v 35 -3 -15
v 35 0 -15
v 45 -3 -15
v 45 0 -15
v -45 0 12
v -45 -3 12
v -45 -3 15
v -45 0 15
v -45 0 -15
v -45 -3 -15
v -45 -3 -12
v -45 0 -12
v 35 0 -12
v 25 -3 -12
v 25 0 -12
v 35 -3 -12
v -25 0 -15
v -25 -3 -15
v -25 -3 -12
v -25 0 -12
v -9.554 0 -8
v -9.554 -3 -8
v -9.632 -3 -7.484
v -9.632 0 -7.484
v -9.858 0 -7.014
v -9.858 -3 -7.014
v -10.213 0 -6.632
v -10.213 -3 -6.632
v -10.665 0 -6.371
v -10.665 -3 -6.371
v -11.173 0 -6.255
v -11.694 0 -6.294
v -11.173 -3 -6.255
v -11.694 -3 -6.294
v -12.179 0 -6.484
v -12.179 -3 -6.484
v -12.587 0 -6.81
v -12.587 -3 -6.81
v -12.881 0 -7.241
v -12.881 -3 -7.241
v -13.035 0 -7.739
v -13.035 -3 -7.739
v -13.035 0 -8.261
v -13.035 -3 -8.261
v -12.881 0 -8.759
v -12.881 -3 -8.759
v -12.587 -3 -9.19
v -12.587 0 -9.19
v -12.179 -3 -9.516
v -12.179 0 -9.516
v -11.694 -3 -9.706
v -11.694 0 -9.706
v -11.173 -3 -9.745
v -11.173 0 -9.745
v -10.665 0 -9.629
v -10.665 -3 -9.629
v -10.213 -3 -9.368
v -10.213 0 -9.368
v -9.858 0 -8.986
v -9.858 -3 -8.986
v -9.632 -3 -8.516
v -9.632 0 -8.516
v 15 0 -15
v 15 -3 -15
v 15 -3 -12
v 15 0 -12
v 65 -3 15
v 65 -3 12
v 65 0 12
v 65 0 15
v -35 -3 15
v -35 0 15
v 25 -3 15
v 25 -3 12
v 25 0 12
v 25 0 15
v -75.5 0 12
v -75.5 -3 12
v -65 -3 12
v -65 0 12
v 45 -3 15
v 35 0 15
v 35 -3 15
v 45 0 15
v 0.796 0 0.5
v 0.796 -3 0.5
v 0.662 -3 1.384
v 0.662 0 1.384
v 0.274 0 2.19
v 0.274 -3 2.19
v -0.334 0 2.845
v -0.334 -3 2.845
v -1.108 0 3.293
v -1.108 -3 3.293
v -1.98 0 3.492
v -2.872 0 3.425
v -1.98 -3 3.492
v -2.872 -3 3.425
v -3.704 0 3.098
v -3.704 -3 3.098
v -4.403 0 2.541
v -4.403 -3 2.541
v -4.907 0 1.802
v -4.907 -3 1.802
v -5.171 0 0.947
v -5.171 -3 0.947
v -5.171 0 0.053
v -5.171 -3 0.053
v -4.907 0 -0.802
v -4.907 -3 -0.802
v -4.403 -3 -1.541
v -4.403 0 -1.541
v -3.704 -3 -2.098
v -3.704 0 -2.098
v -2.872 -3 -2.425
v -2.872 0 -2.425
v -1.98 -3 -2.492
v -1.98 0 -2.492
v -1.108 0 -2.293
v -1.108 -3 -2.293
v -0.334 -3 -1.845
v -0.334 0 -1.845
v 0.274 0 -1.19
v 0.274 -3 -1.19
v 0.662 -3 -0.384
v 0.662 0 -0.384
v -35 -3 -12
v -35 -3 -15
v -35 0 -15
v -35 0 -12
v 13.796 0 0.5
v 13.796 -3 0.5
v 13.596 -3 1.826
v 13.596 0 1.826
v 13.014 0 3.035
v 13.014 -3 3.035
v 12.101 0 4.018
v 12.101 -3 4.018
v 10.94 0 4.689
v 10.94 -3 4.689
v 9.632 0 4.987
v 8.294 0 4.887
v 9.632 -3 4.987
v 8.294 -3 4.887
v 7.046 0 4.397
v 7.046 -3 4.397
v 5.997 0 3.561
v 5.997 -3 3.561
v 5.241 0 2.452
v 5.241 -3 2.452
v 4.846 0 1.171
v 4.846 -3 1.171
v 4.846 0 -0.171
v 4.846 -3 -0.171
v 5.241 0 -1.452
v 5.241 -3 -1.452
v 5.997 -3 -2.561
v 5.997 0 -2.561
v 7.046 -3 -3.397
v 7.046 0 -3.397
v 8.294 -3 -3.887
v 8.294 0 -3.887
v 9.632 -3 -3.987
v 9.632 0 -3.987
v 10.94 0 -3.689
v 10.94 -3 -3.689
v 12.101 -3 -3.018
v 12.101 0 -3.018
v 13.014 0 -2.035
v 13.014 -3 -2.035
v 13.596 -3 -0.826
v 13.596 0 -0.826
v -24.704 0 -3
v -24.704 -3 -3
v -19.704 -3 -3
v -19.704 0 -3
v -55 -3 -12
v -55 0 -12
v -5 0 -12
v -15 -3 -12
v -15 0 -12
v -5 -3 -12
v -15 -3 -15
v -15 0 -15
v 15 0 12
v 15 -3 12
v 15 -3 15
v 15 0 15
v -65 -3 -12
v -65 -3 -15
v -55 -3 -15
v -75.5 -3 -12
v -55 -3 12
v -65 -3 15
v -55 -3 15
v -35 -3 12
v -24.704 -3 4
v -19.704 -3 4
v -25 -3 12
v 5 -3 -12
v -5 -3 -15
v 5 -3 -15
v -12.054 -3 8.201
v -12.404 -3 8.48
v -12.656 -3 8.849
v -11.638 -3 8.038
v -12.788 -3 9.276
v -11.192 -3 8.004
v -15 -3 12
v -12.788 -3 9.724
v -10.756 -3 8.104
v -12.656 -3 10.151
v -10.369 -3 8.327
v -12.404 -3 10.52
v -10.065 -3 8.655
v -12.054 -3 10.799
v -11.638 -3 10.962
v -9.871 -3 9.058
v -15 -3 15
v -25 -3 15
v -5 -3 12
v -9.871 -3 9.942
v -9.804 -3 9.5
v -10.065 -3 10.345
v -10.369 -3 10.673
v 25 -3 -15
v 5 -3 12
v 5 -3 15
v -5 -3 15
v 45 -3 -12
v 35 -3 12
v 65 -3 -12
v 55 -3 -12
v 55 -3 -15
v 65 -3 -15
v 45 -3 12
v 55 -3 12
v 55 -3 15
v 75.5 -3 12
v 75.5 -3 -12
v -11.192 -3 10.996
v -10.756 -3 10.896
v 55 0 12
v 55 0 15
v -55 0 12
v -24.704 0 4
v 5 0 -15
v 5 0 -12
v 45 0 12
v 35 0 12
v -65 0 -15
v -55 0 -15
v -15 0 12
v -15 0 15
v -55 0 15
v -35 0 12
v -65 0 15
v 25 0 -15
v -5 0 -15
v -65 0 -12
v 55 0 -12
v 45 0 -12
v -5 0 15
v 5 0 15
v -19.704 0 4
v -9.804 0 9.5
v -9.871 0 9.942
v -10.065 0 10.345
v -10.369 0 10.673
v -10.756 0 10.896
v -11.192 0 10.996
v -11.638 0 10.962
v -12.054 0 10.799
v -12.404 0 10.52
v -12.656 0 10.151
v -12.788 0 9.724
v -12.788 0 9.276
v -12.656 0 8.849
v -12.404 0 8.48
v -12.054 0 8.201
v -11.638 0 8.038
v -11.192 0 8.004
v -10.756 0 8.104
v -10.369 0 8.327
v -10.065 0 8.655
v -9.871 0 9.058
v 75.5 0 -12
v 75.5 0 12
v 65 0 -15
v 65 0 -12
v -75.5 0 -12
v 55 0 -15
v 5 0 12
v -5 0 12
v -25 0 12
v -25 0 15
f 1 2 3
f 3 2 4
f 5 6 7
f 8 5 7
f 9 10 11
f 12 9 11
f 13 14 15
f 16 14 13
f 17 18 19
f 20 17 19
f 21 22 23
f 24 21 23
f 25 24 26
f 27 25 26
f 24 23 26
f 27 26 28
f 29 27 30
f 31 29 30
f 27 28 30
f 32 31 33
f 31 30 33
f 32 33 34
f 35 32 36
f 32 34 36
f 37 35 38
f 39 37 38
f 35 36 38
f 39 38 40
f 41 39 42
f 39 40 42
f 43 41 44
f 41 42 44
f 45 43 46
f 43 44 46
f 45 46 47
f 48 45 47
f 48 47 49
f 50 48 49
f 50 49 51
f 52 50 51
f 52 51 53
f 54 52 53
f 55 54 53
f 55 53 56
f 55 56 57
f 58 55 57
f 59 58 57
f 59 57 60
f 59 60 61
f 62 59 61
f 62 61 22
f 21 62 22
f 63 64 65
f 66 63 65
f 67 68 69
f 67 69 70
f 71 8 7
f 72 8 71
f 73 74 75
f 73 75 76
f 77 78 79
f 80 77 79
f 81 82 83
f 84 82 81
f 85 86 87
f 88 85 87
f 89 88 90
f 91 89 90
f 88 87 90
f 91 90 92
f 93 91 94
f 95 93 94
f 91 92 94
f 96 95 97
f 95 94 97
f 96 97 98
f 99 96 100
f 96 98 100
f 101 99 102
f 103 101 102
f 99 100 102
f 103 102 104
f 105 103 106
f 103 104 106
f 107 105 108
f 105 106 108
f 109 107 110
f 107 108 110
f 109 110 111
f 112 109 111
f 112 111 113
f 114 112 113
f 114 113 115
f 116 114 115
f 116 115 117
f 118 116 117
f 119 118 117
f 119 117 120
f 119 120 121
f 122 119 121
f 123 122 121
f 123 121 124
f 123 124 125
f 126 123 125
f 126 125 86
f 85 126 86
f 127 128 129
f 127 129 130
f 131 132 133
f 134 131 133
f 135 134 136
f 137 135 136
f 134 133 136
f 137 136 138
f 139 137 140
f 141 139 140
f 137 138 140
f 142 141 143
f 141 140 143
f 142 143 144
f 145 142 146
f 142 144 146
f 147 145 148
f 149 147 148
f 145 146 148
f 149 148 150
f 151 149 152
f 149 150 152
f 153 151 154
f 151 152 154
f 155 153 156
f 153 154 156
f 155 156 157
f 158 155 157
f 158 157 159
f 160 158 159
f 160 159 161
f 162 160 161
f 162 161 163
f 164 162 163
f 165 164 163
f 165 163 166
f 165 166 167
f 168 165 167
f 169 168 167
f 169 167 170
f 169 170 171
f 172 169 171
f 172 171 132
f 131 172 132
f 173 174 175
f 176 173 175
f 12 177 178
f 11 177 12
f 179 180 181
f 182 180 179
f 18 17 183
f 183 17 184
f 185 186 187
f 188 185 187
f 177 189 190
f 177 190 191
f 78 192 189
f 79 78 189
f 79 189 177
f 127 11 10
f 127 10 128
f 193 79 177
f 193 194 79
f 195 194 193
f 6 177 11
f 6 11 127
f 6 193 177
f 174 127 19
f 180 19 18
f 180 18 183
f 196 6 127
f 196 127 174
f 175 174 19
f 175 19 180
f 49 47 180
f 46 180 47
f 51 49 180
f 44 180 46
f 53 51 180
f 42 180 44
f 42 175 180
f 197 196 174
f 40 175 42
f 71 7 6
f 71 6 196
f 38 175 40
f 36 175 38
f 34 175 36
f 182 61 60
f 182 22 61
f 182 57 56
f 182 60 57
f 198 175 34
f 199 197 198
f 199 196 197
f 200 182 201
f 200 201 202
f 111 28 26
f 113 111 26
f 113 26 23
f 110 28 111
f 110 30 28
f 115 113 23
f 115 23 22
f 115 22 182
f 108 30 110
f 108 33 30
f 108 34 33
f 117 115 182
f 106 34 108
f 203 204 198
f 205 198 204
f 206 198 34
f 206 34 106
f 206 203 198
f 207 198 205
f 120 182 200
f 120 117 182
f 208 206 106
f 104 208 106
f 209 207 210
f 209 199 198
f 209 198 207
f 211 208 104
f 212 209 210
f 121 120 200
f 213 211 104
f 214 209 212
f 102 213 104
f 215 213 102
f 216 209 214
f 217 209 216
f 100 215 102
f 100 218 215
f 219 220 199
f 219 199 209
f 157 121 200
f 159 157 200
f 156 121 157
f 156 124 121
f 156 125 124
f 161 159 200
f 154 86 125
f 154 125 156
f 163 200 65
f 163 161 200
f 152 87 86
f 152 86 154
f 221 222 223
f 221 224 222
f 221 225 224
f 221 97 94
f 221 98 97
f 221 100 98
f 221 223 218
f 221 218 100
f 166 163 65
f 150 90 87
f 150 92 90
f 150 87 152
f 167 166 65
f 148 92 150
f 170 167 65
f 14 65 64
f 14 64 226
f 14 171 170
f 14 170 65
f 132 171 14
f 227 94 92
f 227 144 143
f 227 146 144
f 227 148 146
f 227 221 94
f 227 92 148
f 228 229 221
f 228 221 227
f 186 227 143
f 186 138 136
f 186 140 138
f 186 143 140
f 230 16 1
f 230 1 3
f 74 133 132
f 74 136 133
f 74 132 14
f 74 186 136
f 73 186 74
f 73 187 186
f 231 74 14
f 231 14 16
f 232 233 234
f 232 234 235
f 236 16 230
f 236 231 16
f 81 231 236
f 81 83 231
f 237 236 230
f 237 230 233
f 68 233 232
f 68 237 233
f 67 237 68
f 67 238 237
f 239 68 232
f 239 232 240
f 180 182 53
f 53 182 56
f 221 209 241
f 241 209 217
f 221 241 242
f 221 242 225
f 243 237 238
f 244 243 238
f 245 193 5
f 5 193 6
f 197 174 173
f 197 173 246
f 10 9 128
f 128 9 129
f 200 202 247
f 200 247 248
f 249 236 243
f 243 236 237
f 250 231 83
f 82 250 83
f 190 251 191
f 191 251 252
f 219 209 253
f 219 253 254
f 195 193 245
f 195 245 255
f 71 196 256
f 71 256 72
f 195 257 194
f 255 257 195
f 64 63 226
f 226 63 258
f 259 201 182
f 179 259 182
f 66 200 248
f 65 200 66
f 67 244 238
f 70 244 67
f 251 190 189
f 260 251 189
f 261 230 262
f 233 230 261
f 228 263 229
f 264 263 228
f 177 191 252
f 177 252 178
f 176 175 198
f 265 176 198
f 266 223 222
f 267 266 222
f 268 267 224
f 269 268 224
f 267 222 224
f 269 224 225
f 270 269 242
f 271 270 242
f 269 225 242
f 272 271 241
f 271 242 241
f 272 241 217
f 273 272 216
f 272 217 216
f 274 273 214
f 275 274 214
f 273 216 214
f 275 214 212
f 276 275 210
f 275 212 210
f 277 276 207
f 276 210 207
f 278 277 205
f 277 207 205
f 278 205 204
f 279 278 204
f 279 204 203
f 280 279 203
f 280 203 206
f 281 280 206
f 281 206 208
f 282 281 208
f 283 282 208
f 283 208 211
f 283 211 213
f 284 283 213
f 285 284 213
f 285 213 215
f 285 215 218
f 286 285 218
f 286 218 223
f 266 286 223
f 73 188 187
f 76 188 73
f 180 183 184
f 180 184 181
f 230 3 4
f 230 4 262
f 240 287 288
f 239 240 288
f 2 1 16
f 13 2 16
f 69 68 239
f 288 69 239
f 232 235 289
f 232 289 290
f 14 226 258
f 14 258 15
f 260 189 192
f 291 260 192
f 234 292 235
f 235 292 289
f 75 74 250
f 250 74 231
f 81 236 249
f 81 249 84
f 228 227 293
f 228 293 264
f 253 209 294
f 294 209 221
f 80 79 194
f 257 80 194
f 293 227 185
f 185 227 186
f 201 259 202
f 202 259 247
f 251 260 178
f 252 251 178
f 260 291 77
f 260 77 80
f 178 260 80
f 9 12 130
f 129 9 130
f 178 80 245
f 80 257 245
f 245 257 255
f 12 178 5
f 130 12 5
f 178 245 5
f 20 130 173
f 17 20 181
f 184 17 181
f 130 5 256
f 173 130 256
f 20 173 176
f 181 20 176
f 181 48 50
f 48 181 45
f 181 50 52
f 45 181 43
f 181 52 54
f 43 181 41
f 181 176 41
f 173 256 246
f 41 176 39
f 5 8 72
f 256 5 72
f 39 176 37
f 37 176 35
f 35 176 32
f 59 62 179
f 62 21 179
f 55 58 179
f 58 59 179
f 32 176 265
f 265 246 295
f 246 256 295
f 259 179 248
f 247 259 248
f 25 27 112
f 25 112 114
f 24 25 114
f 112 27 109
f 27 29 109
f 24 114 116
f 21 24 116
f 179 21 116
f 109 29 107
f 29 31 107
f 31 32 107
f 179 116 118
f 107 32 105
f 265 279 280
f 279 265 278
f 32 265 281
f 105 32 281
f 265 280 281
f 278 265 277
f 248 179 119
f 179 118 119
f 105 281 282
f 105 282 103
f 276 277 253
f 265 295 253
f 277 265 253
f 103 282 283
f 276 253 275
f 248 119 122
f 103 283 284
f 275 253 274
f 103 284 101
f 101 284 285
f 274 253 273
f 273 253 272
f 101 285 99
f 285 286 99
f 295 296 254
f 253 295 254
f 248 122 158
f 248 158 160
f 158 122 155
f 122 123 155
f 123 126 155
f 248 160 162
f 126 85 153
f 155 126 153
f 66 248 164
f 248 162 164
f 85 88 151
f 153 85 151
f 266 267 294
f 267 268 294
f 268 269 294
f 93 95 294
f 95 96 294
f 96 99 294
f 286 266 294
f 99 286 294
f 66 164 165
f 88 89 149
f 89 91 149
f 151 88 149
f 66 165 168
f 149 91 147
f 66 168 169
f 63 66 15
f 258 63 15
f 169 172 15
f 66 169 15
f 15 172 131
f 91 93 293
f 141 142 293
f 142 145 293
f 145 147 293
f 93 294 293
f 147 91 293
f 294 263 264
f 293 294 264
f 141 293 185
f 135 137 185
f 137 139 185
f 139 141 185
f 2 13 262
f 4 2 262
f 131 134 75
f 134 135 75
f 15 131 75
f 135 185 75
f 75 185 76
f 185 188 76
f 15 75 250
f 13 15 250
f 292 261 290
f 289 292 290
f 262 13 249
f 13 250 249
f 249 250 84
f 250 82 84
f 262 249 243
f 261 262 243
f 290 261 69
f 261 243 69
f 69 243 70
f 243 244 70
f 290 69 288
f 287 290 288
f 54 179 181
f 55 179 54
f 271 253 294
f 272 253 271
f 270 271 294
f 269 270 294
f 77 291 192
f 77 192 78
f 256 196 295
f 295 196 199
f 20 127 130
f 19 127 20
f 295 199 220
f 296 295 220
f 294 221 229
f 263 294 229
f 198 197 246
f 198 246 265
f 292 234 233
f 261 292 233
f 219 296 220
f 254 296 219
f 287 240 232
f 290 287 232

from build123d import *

# Parameters (mm, degrees)
F0_W     = 151
F0_H     = 30
F1_DEPTH = 3
F2_W     = 5
F2_H     = 3
F2_W_2   = 6.448428
F2_W_3   = 10
F2_W_4   = 3.551572
F2_R     = 4.5
F2_R_2   = 1.5
F2_R_3   = 1.75
F2_R_4   = 3
F2_H_2   = 7
F3_DEPTH = 25


with BuildPart() as f1:
    # F0 (on Front) → F1 (new body)
    with BuildSketch(Plane.XZ):
        Rectangle(F0_W, F0_H)
    extrude(amount=F1_DEPTH)

    # F2 (on face) → F3 (cut)
    with BuildSketch(Plane.XZ.offset(3)):
        with Locations((-72.5, -13.5)):
            Rectangle(F2_W, F2_H)
        with Locations((-78.224214, -13.5)):
            Rectangle(F2_W_2, F2_H)
        with Locations((-67.5, -13.5)):
            Rectangle(F2_W, F2_H)
        with Locations((-72.5, 13.5)):
            Rectangle(F2_W, F2_H)
        with Locations((-78.224214, 13.5)):
            Rectangle(F2_W_2, F2_H)
        with Locations((-67.5, 13.5)):
            Rectangle(F2_W, F2_H)
        with Locations((-50, -13.5)):
            Rectangle(F2_W_3, F2_H)
        with Locations((-50, 13.5)):
            Rectangle(F2_W_3, F2_H)
        with Locations((-30, -13.5)):
            Rectangle(F2_W_3, F2_H)
        with Locations((-30, 13.5)):
            Rectangle(F2_W_3, F2_H)
        with Locations((-10, -13.5)):
            Rectangle(F2_W_3, F2_H)
        with Locations((-10, 13.5)):
            Rectangle(F2_W_3, F2_H)
        with Locations((10, -13.5)):
            Rectangle(F2_W_3, F2_H)
        with Locations((10, 13.5)):
            Rectangle(F2_W_3, F2_H)
        with Locations((30, -13.5)):
            Rectangle(F2_W_3, F2_H)
        with Locations((30, 13.5)):
            Rectangle(F2_W_3, F2_H)
        with Locations((50, -13.5)):
            Rectangle(F2_W_3, F2_H)
        with Locations((50, 13.5)):
            Rectangle(F2_W_3, F2_H)
        with Locations((66.775786, -13.5)):
            Rectangle(F2_W_4, F2_H)
        with Locations((71.775786, -13.5)):
            Rectangle(F2_W_2, F2_H)
        with Locations((77.5, -13.5)):
            Rectangle(F2_W, F2_H)
        with Locations((66.775786, 13.5)):
            Rectangle(F2_W_4, F2_H)
        with Locations((71.775786, 13.5)):
            Rectangle(F2_W_2, F2_H)
        with Locations((77.5, 13.5)):
            Rectangle(F2_W, F2_H)
        with Locations((9.295744, 0.5)):
            Circle(F2_R)
        with Locations((-11.304256, 9.5)):
            Circle(F2_R_2)
        with Locations((-11.304256, -8)):
            Circle(F2_R_3)
        with Locations((-2.204256, 0.5)):
            Circle(F2_R_4)
        with Locations((-22.204256, 0.5)):
            Rectangle(F2_W, F2_H_2)
    extrude(amount=-F3_DEPTH, mode=Mode.SUBTRACT)


solid = f1.part
